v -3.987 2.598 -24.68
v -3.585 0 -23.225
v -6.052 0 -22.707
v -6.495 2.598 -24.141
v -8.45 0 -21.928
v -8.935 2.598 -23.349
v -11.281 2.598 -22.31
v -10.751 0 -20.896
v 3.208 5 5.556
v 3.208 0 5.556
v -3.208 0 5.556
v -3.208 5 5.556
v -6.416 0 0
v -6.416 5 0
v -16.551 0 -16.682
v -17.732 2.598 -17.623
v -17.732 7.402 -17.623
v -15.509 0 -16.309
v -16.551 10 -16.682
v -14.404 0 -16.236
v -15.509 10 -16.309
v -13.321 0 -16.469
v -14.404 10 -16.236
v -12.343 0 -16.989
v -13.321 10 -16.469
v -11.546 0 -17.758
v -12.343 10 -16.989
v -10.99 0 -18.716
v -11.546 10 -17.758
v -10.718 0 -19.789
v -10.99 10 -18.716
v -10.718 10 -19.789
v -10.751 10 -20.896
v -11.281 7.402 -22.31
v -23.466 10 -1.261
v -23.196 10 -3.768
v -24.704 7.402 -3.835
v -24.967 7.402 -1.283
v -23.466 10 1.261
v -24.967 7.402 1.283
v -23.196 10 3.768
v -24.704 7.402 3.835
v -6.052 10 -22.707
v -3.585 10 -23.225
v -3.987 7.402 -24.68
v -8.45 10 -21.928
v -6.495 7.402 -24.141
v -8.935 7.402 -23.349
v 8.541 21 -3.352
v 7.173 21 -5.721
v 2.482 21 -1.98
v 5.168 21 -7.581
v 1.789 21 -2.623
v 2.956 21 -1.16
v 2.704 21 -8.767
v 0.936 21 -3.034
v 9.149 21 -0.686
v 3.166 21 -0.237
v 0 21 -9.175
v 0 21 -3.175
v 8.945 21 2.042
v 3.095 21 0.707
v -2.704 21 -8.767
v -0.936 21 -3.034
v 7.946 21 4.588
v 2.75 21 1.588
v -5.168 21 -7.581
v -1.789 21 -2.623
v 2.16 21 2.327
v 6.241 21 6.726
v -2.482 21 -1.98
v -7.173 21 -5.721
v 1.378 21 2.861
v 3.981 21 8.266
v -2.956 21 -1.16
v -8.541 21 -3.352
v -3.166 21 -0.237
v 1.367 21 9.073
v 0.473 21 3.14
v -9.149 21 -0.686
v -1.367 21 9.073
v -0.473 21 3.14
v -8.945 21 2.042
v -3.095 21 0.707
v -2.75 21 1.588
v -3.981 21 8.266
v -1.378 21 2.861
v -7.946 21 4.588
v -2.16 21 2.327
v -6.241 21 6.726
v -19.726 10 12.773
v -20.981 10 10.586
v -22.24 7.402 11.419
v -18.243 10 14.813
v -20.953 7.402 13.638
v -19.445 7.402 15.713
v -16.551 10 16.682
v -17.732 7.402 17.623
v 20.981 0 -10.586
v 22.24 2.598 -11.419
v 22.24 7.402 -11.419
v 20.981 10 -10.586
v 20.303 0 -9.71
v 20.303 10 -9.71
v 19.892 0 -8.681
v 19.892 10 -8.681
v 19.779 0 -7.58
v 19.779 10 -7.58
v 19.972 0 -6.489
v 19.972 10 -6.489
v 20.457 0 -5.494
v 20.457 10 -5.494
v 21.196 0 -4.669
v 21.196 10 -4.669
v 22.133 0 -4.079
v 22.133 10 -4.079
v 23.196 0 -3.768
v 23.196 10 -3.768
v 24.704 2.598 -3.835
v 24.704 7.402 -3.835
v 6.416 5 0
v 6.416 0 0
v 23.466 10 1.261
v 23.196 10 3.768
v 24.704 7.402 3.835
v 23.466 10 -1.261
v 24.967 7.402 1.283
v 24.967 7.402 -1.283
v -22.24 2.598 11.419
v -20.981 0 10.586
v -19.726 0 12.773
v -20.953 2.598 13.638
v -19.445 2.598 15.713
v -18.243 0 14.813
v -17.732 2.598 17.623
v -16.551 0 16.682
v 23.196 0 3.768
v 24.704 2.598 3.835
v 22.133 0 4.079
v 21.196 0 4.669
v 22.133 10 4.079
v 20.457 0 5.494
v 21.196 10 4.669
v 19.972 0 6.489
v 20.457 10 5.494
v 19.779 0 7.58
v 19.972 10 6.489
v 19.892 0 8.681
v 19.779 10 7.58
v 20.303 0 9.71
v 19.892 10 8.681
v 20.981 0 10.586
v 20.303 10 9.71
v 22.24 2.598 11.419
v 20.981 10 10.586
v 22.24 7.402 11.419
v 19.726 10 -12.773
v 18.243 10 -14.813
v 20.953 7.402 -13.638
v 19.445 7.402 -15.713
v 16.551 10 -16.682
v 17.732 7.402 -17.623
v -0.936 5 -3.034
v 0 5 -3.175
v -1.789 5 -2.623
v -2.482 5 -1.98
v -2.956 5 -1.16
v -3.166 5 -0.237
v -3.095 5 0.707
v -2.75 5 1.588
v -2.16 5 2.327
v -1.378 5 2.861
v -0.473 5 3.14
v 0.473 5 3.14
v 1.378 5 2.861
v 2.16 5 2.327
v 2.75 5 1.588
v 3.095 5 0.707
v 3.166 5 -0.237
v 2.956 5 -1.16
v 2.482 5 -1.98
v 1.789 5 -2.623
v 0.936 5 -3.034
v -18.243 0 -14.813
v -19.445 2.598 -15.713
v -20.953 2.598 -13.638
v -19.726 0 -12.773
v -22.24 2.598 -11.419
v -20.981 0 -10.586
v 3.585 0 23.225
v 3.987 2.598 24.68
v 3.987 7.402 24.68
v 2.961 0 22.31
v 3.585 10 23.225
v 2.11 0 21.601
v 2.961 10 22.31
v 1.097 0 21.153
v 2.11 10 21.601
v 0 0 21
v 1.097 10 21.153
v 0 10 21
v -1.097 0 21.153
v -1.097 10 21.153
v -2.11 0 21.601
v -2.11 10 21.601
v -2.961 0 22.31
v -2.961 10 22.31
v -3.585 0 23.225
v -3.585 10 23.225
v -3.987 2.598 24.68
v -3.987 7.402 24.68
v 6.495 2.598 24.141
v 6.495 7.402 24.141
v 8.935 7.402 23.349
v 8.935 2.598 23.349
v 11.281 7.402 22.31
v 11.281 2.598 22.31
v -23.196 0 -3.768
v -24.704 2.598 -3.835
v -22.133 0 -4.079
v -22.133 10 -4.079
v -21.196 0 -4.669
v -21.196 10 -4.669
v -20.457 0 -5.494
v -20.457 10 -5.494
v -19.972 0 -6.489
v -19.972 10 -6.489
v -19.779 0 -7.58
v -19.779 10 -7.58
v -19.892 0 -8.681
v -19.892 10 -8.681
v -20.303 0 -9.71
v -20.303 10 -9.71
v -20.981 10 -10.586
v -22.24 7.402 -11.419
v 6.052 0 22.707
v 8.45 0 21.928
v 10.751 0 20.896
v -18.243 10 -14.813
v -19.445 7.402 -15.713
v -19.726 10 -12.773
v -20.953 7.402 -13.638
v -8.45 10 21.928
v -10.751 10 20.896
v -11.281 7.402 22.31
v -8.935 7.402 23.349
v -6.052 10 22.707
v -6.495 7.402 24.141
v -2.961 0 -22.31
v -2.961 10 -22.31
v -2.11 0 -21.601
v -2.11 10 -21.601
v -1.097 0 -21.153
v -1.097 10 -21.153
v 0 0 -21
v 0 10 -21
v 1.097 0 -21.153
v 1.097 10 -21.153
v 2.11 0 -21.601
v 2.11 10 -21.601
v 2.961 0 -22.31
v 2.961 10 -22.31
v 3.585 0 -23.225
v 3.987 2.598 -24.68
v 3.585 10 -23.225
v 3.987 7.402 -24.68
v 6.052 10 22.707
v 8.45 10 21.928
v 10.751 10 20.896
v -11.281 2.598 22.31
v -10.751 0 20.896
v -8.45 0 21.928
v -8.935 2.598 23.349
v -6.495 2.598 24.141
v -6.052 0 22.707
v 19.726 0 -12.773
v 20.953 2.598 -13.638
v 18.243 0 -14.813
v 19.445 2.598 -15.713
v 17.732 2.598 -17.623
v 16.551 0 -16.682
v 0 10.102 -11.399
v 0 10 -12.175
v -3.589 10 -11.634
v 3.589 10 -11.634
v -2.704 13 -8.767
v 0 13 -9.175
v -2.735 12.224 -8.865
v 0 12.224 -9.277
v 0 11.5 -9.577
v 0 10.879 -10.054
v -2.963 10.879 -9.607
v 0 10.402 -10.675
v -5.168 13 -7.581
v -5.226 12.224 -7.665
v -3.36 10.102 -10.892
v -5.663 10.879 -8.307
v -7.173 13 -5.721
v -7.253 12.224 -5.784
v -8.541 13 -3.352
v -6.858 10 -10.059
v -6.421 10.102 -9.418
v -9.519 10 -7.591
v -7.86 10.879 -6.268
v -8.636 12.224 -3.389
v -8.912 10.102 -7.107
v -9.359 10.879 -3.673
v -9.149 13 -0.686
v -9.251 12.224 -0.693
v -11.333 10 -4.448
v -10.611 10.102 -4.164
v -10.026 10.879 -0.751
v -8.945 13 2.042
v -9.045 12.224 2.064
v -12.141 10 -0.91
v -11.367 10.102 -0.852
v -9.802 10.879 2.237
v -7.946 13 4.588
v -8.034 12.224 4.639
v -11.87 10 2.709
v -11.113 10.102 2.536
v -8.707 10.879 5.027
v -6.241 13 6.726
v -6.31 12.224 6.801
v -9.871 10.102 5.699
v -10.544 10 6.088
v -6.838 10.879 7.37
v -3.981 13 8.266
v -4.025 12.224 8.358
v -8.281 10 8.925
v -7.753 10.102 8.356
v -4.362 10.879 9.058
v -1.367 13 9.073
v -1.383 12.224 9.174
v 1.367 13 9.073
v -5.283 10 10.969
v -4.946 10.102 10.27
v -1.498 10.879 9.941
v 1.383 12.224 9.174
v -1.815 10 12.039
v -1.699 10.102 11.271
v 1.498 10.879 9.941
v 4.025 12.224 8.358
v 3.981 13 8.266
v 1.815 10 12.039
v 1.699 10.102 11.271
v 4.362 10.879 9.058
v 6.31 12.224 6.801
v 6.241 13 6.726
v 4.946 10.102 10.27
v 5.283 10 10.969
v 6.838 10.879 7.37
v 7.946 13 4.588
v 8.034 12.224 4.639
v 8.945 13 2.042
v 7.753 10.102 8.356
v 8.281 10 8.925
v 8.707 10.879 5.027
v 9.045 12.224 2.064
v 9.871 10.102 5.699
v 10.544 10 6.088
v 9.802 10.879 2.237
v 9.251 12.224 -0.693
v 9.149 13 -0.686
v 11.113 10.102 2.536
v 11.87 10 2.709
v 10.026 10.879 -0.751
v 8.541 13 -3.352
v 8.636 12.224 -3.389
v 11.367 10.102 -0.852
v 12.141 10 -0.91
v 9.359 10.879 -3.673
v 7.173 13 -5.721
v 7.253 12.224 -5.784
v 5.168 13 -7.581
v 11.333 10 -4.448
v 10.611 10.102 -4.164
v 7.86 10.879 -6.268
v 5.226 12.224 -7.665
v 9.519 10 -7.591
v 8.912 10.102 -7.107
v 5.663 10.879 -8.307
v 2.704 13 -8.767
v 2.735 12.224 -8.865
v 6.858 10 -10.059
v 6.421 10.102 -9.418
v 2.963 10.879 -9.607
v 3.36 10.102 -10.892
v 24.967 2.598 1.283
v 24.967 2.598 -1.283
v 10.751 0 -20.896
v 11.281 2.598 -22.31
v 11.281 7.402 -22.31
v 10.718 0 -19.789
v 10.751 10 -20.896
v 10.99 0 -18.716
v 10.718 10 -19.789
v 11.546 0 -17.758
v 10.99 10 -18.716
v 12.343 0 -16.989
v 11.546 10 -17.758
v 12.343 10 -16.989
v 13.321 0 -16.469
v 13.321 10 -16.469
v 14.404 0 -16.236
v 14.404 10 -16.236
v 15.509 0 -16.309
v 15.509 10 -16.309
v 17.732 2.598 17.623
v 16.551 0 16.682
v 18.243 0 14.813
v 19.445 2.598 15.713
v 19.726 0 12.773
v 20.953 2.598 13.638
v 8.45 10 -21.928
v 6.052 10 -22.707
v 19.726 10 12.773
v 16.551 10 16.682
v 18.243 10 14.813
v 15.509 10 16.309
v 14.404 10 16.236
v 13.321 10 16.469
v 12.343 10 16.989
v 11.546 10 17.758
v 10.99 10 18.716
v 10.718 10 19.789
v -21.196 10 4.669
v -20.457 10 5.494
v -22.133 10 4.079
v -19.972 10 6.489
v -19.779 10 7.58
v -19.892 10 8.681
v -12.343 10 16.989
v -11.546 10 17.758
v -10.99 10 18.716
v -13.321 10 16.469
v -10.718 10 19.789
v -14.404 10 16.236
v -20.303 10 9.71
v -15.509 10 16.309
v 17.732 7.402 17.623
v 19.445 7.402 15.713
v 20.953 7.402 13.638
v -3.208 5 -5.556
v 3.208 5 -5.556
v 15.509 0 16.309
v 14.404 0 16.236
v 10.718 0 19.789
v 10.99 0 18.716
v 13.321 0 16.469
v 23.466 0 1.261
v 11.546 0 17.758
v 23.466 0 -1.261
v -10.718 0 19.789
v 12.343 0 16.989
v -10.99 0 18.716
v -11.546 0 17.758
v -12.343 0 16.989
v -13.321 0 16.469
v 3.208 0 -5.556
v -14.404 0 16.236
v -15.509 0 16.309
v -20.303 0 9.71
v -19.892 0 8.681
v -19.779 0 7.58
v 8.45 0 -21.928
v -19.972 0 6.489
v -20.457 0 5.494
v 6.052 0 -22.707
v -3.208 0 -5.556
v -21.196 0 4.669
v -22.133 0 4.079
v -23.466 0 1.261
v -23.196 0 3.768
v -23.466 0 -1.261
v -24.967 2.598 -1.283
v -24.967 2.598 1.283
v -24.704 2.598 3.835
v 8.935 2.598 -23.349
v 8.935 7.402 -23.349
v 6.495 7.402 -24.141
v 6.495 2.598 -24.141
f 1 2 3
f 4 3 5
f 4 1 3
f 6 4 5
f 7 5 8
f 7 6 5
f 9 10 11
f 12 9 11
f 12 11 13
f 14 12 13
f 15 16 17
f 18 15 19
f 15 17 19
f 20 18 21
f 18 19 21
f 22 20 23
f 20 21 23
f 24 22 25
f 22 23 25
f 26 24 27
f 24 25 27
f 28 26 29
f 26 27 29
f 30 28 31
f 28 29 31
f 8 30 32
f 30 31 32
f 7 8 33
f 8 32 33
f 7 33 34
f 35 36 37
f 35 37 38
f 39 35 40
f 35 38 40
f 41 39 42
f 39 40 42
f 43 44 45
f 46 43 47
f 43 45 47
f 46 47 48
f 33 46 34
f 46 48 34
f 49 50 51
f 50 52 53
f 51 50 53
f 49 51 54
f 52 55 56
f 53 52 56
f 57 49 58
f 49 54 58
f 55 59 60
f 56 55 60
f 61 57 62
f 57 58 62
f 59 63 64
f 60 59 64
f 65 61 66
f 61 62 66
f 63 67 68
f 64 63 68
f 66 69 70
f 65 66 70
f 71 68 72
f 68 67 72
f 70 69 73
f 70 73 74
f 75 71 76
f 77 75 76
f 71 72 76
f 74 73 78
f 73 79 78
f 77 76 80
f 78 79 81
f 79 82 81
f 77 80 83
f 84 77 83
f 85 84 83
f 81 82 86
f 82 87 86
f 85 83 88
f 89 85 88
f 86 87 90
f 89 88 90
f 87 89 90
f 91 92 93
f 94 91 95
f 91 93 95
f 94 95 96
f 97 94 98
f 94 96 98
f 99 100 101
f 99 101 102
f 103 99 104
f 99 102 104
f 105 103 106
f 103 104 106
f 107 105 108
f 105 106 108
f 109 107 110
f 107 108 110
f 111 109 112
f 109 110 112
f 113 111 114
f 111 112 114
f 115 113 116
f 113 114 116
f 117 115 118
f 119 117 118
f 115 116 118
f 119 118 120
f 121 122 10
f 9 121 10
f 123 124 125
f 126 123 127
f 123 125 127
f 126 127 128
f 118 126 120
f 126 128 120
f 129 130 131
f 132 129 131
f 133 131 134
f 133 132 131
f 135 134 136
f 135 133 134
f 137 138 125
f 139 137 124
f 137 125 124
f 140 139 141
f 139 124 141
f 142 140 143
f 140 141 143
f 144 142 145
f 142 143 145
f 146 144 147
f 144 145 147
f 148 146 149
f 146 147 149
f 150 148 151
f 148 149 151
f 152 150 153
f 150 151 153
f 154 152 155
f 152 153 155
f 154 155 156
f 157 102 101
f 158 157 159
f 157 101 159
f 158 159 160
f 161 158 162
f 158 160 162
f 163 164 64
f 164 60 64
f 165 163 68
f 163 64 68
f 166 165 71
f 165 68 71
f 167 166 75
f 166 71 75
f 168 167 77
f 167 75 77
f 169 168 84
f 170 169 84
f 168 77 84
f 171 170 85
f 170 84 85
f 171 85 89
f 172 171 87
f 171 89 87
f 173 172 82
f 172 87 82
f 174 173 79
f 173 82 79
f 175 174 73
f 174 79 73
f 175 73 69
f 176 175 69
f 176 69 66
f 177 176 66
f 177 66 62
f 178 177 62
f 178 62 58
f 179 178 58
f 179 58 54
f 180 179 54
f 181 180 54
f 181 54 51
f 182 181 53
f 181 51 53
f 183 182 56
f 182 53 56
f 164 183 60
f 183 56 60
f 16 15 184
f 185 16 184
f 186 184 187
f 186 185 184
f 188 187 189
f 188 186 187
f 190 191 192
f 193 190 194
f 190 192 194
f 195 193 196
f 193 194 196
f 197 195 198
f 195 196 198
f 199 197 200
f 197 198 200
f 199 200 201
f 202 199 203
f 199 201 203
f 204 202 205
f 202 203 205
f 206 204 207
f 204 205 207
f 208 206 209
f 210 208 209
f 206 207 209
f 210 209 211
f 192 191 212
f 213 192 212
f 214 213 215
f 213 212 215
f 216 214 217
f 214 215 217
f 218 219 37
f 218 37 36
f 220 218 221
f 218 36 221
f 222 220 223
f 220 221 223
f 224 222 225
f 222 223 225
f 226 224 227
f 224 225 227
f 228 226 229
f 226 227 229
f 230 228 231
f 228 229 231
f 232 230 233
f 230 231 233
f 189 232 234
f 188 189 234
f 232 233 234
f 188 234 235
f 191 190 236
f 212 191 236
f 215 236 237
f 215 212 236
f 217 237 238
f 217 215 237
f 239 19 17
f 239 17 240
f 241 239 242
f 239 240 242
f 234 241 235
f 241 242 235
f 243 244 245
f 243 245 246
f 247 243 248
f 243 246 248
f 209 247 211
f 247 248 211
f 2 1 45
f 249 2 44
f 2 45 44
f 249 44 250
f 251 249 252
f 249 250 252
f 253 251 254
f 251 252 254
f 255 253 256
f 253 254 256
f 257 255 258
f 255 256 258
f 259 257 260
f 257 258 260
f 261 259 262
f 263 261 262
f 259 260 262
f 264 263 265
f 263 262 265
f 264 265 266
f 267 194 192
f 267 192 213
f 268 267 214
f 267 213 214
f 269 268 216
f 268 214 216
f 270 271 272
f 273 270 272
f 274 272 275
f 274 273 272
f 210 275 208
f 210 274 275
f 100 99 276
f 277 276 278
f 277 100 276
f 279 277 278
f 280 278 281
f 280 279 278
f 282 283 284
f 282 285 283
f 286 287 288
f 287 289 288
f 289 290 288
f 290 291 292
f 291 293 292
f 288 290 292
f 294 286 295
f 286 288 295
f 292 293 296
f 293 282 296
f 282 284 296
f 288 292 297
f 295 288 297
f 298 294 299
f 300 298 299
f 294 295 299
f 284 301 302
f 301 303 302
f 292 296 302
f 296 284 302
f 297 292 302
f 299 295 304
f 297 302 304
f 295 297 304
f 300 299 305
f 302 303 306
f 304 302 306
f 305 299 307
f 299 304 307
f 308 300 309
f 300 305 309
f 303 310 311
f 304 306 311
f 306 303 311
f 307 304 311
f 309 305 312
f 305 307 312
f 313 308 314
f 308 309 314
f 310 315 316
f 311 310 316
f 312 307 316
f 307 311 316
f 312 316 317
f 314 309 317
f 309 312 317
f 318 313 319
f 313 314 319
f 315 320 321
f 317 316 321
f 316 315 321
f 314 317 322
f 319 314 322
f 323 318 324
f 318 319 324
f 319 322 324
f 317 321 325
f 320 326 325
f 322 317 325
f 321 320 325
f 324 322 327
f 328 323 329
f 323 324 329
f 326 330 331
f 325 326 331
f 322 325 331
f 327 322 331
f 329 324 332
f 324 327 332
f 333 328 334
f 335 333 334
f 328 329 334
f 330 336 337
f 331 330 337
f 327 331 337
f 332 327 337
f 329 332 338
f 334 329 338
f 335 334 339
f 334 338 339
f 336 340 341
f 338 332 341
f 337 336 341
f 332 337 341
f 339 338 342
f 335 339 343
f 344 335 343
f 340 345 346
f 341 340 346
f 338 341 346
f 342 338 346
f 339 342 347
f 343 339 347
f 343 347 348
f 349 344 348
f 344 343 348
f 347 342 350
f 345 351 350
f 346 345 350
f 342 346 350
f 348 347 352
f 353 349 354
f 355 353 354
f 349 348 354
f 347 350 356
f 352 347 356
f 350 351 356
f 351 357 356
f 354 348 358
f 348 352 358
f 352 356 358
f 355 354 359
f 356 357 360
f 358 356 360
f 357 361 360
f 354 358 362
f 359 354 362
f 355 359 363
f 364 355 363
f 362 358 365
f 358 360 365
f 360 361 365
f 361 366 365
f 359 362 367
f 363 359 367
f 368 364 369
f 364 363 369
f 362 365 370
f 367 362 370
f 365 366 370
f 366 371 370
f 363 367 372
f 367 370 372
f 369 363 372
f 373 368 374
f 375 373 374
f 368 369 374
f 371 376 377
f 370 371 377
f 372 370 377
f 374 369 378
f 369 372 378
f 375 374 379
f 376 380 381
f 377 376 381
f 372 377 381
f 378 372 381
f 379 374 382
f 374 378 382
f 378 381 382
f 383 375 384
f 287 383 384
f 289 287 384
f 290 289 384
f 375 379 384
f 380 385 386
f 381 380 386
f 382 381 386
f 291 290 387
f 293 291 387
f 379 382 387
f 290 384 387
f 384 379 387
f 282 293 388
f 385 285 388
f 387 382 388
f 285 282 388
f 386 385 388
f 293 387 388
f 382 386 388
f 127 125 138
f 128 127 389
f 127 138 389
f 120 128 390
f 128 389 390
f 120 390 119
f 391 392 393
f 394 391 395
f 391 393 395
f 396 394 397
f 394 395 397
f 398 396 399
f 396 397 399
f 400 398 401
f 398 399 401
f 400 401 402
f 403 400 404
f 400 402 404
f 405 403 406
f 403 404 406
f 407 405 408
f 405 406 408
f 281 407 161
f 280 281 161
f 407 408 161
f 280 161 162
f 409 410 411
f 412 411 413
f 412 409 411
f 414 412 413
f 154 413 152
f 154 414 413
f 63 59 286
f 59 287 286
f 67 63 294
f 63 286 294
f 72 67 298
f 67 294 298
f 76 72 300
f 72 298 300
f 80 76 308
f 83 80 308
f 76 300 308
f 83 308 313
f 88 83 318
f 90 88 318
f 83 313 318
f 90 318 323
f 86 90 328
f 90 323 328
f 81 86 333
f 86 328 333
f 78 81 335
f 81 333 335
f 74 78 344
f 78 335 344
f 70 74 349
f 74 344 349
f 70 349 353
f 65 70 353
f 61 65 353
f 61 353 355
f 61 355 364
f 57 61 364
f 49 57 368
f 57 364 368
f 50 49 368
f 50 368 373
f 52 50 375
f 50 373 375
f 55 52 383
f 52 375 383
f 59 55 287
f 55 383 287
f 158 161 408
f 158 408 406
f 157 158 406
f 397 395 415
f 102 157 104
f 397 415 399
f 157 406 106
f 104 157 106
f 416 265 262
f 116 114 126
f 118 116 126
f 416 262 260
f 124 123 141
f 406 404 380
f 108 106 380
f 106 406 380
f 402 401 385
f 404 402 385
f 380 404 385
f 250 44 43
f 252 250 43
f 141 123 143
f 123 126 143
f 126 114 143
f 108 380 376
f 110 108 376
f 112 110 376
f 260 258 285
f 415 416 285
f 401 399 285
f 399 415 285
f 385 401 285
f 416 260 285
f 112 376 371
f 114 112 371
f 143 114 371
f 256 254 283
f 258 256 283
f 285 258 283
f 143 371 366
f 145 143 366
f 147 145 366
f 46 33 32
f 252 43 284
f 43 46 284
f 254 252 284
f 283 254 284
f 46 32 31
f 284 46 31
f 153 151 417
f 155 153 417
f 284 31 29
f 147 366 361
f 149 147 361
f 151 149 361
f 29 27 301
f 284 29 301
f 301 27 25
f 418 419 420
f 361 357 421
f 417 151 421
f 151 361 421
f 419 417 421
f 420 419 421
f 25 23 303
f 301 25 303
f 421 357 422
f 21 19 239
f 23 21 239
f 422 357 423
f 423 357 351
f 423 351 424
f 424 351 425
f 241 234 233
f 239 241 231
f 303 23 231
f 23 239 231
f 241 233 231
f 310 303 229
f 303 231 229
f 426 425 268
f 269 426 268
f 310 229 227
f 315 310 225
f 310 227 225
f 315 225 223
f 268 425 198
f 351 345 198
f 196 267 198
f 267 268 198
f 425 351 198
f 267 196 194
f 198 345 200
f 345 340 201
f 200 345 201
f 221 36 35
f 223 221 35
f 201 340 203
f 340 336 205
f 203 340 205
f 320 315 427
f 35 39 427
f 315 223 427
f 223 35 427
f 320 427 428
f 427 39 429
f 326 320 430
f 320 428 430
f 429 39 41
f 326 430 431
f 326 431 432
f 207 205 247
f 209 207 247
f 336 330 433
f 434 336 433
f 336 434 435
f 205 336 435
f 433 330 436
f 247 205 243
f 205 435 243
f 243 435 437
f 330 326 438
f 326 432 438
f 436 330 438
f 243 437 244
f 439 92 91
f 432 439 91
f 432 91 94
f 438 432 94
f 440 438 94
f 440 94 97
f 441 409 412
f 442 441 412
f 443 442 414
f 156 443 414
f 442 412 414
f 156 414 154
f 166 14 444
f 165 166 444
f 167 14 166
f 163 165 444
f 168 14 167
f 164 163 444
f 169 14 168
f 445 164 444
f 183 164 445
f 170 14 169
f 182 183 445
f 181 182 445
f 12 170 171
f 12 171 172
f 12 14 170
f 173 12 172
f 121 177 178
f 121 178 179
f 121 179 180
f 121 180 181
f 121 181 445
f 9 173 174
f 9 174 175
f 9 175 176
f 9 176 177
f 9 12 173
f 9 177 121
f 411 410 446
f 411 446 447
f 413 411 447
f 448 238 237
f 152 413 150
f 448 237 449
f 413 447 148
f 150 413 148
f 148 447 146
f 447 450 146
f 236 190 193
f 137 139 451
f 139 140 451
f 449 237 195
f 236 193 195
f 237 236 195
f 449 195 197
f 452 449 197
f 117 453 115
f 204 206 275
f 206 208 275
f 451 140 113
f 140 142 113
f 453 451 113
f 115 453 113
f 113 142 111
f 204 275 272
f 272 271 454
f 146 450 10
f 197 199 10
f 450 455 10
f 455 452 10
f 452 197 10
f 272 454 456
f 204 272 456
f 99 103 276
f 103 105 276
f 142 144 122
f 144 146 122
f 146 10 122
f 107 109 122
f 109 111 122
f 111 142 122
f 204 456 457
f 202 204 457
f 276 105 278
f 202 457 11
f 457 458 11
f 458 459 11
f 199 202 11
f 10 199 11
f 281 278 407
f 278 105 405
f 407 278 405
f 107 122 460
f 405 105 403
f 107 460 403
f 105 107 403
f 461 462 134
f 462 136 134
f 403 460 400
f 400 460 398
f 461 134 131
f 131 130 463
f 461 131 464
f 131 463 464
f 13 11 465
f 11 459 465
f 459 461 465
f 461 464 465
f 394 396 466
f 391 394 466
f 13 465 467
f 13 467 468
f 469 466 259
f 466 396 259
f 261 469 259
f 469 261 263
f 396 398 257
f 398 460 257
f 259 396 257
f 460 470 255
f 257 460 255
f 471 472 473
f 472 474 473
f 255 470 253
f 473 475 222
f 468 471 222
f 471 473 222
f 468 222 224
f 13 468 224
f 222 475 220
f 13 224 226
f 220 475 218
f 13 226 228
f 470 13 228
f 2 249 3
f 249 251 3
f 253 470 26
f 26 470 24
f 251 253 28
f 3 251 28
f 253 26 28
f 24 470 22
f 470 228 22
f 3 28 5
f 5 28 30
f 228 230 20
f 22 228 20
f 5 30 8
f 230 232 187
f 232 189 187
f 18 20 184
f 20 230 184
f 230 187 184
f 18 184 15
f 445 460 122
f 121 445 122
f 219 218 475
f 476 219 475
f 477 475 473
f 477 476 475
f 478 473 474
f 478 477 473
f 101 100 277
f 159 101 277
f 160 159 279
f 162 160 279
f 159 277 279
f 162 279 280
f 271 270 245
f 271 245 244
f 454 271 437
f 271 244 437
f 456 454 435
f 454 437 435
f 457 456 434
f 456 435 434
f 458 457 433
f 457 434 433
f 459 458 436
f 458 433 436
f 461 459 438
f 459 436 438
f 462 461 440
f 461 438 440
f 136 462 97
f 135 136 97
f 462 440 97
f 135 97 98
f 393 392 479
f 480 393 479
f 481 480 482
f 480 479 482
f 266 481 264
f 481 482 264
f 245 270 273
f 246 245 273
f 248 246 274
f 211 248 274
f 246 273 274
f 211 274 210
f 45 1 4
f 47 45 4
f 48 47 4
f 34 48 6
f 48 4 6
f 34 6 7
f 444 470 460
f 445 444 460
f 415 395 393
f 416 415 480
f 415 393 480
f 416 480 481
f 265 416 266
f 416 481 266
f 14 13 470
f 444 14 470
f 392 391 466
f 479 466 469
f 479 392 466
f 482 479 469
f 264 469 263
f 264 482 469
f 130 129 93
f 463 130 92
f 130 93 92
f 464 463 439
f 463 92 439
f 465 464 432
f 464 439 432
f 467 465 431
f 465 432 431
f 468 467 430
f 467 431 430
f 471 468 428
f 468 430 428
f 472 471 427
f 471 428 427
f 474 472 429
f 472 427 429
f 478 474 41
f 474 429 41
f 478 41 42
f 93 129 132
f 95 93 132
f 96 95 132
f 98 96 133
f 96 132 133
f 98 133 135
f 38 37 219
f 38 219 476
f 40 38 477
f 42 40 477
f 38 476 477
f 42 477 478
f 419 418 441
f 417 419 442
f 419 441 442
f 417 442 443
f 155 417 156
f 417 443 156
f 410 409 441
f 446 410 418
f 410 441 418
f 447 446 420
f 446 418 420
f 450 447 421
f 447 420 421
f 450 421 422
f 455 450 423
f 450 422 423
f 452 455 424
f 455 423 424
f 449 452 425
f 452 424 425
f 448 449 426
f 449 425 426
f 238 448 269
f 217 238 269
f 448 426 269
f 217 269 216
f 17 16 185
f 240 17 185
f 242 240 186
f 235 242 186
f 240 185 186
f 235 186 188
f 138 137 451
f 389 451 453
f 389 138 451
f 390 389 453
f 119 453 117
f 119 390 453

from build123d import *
from OCP.BRepFilletAPI import BRepFilletAPI_MakeChamfer

# Parameters (mm, degrees)
CUT_EXTRUDE3_DEPTH = 38.027017163
CHAMFER1_SIZE      = 1.5
CHAMFER1_SIZE2     = 2.598076211
CIRPATTERN1_COUNT  = 10
CUT_EXTRUDE2_DEPTH = 5


with BuildPart() as part:
    # Sketch1 → Revolve1 (revolve)
    with BuildSketch(Plane.XY, mode=Mode.PRIVATE) as revolve1_sk:
        with BuildLine():
            Line((3.175, 0), (3.175, 21))
            Line((3.175, 21), (9.175, 21))
            Line((9.175, 21), (9.175, 13))
            ThreePointArc((9.175, 13), (10.053679656, 10.878679656), (12.175, 10))
            Line((12.175, 10), (25, 10))
            Line((25, 10), (25, 0))
            Line((25, 0), (3.175, 0))
        make_face()
    revolve(revolve1_sk.sketch.rotate(Axis((0, 0, 0), (0, 1, 0)), 90), axis=Axis((0, 0, 0), (0, 1, 0)))

    # Sketch4 → Cut-Extrude3 (cut, through all)
    with BuildSketch(Plane(origin=(0, 10, 0), x_dir=(1, 0, 0), z_dir=(0, 1, 0))):
        with BuildLine():
            ThreePointArc((-3.987179454, 24.68), (0, 21), (3.987179454, 24.68))
            ThreePointArc((3.987179454, 24.68), (0, 25), (-3.987179454, 24.68))
        make_face()
    cut_extrude3 = extrude(amount=-CUT_EXTRUDE3_DEPTH, mode=Mode.SUBTRACT)

    # Chamfer1: one chamfer whose edges measure the first distance from different faces: ONE call of the kernel's chamfer builder (chamfer() names one face for all edges)
    chamfer1_edges_1 = [part.edges().sort_by_distance(p)[0] for p in [
        (0, 10, 25),
    ]]
    chamfer1_side_1 = [part.faces().sort_by_distance(p)[0] for p in [
        (0, 10, 24.295152329),
    ]]
    chamfer1_edges_2 = [part.edges().sort_by_distance(p)[0] for p in [
        (0, 0, 25),
    ]]
    chamfer1_side_2 = [part.faces().sort_by_distance(p)[0] for p in [
        (0, 0, -20.295152329),
    ]]
    chamfer1 = BRepFilletAPI_MakeChamfer(part.part.solid().wrapped)
    for e in chamfer1_edges_1:
        chamfer1.Add(CHAMFER1_SIZE, CHAMFER1_SIZE2, e.wrapped, chamfer1_side_1[0].wrapped)  # the first distance lies on this face
    for e in chamfer1_edges_2:
        chamfer1.Add(CHAMFER1_SIZE, CHAMFER1_SIZE2, e.wrapped, chamfer1_side_2[0].wrapped)  # the first distance lies on this face
    add(Compound.cast(chamfer1.Shape()), mode=Mode.REPLACE)

    # CirPattern1: Cut-Extrude3 ×10 about axis
    cirpattern1_axis = Axis((0, 0, 0), (0, 1, 0))
    for i in range(1, CIRPATTERN1_COUNT):
        add(cut_extrude3.rotate(cirpattern1_axis, i * 360 / CIRPATTERN1_COUNT), mode=Mode.SUBTRACT)

    # Sketch3 → Cut-Extrude2 (cut)
    with BuildSketch(Plane.XZ):
        Polygon((3.207902433, 5.55625), (-3.207902433, 5.55625), (-6.415804866, 0), (-3.207902433, -5.55625), (3.207902433, -5.55625), (6.415804866, 0), align=None)
    extrude(amount=-CUT_EXTRUDE2_DEPTH, mode=Mode.SUBTRACT)


solid = part.part
